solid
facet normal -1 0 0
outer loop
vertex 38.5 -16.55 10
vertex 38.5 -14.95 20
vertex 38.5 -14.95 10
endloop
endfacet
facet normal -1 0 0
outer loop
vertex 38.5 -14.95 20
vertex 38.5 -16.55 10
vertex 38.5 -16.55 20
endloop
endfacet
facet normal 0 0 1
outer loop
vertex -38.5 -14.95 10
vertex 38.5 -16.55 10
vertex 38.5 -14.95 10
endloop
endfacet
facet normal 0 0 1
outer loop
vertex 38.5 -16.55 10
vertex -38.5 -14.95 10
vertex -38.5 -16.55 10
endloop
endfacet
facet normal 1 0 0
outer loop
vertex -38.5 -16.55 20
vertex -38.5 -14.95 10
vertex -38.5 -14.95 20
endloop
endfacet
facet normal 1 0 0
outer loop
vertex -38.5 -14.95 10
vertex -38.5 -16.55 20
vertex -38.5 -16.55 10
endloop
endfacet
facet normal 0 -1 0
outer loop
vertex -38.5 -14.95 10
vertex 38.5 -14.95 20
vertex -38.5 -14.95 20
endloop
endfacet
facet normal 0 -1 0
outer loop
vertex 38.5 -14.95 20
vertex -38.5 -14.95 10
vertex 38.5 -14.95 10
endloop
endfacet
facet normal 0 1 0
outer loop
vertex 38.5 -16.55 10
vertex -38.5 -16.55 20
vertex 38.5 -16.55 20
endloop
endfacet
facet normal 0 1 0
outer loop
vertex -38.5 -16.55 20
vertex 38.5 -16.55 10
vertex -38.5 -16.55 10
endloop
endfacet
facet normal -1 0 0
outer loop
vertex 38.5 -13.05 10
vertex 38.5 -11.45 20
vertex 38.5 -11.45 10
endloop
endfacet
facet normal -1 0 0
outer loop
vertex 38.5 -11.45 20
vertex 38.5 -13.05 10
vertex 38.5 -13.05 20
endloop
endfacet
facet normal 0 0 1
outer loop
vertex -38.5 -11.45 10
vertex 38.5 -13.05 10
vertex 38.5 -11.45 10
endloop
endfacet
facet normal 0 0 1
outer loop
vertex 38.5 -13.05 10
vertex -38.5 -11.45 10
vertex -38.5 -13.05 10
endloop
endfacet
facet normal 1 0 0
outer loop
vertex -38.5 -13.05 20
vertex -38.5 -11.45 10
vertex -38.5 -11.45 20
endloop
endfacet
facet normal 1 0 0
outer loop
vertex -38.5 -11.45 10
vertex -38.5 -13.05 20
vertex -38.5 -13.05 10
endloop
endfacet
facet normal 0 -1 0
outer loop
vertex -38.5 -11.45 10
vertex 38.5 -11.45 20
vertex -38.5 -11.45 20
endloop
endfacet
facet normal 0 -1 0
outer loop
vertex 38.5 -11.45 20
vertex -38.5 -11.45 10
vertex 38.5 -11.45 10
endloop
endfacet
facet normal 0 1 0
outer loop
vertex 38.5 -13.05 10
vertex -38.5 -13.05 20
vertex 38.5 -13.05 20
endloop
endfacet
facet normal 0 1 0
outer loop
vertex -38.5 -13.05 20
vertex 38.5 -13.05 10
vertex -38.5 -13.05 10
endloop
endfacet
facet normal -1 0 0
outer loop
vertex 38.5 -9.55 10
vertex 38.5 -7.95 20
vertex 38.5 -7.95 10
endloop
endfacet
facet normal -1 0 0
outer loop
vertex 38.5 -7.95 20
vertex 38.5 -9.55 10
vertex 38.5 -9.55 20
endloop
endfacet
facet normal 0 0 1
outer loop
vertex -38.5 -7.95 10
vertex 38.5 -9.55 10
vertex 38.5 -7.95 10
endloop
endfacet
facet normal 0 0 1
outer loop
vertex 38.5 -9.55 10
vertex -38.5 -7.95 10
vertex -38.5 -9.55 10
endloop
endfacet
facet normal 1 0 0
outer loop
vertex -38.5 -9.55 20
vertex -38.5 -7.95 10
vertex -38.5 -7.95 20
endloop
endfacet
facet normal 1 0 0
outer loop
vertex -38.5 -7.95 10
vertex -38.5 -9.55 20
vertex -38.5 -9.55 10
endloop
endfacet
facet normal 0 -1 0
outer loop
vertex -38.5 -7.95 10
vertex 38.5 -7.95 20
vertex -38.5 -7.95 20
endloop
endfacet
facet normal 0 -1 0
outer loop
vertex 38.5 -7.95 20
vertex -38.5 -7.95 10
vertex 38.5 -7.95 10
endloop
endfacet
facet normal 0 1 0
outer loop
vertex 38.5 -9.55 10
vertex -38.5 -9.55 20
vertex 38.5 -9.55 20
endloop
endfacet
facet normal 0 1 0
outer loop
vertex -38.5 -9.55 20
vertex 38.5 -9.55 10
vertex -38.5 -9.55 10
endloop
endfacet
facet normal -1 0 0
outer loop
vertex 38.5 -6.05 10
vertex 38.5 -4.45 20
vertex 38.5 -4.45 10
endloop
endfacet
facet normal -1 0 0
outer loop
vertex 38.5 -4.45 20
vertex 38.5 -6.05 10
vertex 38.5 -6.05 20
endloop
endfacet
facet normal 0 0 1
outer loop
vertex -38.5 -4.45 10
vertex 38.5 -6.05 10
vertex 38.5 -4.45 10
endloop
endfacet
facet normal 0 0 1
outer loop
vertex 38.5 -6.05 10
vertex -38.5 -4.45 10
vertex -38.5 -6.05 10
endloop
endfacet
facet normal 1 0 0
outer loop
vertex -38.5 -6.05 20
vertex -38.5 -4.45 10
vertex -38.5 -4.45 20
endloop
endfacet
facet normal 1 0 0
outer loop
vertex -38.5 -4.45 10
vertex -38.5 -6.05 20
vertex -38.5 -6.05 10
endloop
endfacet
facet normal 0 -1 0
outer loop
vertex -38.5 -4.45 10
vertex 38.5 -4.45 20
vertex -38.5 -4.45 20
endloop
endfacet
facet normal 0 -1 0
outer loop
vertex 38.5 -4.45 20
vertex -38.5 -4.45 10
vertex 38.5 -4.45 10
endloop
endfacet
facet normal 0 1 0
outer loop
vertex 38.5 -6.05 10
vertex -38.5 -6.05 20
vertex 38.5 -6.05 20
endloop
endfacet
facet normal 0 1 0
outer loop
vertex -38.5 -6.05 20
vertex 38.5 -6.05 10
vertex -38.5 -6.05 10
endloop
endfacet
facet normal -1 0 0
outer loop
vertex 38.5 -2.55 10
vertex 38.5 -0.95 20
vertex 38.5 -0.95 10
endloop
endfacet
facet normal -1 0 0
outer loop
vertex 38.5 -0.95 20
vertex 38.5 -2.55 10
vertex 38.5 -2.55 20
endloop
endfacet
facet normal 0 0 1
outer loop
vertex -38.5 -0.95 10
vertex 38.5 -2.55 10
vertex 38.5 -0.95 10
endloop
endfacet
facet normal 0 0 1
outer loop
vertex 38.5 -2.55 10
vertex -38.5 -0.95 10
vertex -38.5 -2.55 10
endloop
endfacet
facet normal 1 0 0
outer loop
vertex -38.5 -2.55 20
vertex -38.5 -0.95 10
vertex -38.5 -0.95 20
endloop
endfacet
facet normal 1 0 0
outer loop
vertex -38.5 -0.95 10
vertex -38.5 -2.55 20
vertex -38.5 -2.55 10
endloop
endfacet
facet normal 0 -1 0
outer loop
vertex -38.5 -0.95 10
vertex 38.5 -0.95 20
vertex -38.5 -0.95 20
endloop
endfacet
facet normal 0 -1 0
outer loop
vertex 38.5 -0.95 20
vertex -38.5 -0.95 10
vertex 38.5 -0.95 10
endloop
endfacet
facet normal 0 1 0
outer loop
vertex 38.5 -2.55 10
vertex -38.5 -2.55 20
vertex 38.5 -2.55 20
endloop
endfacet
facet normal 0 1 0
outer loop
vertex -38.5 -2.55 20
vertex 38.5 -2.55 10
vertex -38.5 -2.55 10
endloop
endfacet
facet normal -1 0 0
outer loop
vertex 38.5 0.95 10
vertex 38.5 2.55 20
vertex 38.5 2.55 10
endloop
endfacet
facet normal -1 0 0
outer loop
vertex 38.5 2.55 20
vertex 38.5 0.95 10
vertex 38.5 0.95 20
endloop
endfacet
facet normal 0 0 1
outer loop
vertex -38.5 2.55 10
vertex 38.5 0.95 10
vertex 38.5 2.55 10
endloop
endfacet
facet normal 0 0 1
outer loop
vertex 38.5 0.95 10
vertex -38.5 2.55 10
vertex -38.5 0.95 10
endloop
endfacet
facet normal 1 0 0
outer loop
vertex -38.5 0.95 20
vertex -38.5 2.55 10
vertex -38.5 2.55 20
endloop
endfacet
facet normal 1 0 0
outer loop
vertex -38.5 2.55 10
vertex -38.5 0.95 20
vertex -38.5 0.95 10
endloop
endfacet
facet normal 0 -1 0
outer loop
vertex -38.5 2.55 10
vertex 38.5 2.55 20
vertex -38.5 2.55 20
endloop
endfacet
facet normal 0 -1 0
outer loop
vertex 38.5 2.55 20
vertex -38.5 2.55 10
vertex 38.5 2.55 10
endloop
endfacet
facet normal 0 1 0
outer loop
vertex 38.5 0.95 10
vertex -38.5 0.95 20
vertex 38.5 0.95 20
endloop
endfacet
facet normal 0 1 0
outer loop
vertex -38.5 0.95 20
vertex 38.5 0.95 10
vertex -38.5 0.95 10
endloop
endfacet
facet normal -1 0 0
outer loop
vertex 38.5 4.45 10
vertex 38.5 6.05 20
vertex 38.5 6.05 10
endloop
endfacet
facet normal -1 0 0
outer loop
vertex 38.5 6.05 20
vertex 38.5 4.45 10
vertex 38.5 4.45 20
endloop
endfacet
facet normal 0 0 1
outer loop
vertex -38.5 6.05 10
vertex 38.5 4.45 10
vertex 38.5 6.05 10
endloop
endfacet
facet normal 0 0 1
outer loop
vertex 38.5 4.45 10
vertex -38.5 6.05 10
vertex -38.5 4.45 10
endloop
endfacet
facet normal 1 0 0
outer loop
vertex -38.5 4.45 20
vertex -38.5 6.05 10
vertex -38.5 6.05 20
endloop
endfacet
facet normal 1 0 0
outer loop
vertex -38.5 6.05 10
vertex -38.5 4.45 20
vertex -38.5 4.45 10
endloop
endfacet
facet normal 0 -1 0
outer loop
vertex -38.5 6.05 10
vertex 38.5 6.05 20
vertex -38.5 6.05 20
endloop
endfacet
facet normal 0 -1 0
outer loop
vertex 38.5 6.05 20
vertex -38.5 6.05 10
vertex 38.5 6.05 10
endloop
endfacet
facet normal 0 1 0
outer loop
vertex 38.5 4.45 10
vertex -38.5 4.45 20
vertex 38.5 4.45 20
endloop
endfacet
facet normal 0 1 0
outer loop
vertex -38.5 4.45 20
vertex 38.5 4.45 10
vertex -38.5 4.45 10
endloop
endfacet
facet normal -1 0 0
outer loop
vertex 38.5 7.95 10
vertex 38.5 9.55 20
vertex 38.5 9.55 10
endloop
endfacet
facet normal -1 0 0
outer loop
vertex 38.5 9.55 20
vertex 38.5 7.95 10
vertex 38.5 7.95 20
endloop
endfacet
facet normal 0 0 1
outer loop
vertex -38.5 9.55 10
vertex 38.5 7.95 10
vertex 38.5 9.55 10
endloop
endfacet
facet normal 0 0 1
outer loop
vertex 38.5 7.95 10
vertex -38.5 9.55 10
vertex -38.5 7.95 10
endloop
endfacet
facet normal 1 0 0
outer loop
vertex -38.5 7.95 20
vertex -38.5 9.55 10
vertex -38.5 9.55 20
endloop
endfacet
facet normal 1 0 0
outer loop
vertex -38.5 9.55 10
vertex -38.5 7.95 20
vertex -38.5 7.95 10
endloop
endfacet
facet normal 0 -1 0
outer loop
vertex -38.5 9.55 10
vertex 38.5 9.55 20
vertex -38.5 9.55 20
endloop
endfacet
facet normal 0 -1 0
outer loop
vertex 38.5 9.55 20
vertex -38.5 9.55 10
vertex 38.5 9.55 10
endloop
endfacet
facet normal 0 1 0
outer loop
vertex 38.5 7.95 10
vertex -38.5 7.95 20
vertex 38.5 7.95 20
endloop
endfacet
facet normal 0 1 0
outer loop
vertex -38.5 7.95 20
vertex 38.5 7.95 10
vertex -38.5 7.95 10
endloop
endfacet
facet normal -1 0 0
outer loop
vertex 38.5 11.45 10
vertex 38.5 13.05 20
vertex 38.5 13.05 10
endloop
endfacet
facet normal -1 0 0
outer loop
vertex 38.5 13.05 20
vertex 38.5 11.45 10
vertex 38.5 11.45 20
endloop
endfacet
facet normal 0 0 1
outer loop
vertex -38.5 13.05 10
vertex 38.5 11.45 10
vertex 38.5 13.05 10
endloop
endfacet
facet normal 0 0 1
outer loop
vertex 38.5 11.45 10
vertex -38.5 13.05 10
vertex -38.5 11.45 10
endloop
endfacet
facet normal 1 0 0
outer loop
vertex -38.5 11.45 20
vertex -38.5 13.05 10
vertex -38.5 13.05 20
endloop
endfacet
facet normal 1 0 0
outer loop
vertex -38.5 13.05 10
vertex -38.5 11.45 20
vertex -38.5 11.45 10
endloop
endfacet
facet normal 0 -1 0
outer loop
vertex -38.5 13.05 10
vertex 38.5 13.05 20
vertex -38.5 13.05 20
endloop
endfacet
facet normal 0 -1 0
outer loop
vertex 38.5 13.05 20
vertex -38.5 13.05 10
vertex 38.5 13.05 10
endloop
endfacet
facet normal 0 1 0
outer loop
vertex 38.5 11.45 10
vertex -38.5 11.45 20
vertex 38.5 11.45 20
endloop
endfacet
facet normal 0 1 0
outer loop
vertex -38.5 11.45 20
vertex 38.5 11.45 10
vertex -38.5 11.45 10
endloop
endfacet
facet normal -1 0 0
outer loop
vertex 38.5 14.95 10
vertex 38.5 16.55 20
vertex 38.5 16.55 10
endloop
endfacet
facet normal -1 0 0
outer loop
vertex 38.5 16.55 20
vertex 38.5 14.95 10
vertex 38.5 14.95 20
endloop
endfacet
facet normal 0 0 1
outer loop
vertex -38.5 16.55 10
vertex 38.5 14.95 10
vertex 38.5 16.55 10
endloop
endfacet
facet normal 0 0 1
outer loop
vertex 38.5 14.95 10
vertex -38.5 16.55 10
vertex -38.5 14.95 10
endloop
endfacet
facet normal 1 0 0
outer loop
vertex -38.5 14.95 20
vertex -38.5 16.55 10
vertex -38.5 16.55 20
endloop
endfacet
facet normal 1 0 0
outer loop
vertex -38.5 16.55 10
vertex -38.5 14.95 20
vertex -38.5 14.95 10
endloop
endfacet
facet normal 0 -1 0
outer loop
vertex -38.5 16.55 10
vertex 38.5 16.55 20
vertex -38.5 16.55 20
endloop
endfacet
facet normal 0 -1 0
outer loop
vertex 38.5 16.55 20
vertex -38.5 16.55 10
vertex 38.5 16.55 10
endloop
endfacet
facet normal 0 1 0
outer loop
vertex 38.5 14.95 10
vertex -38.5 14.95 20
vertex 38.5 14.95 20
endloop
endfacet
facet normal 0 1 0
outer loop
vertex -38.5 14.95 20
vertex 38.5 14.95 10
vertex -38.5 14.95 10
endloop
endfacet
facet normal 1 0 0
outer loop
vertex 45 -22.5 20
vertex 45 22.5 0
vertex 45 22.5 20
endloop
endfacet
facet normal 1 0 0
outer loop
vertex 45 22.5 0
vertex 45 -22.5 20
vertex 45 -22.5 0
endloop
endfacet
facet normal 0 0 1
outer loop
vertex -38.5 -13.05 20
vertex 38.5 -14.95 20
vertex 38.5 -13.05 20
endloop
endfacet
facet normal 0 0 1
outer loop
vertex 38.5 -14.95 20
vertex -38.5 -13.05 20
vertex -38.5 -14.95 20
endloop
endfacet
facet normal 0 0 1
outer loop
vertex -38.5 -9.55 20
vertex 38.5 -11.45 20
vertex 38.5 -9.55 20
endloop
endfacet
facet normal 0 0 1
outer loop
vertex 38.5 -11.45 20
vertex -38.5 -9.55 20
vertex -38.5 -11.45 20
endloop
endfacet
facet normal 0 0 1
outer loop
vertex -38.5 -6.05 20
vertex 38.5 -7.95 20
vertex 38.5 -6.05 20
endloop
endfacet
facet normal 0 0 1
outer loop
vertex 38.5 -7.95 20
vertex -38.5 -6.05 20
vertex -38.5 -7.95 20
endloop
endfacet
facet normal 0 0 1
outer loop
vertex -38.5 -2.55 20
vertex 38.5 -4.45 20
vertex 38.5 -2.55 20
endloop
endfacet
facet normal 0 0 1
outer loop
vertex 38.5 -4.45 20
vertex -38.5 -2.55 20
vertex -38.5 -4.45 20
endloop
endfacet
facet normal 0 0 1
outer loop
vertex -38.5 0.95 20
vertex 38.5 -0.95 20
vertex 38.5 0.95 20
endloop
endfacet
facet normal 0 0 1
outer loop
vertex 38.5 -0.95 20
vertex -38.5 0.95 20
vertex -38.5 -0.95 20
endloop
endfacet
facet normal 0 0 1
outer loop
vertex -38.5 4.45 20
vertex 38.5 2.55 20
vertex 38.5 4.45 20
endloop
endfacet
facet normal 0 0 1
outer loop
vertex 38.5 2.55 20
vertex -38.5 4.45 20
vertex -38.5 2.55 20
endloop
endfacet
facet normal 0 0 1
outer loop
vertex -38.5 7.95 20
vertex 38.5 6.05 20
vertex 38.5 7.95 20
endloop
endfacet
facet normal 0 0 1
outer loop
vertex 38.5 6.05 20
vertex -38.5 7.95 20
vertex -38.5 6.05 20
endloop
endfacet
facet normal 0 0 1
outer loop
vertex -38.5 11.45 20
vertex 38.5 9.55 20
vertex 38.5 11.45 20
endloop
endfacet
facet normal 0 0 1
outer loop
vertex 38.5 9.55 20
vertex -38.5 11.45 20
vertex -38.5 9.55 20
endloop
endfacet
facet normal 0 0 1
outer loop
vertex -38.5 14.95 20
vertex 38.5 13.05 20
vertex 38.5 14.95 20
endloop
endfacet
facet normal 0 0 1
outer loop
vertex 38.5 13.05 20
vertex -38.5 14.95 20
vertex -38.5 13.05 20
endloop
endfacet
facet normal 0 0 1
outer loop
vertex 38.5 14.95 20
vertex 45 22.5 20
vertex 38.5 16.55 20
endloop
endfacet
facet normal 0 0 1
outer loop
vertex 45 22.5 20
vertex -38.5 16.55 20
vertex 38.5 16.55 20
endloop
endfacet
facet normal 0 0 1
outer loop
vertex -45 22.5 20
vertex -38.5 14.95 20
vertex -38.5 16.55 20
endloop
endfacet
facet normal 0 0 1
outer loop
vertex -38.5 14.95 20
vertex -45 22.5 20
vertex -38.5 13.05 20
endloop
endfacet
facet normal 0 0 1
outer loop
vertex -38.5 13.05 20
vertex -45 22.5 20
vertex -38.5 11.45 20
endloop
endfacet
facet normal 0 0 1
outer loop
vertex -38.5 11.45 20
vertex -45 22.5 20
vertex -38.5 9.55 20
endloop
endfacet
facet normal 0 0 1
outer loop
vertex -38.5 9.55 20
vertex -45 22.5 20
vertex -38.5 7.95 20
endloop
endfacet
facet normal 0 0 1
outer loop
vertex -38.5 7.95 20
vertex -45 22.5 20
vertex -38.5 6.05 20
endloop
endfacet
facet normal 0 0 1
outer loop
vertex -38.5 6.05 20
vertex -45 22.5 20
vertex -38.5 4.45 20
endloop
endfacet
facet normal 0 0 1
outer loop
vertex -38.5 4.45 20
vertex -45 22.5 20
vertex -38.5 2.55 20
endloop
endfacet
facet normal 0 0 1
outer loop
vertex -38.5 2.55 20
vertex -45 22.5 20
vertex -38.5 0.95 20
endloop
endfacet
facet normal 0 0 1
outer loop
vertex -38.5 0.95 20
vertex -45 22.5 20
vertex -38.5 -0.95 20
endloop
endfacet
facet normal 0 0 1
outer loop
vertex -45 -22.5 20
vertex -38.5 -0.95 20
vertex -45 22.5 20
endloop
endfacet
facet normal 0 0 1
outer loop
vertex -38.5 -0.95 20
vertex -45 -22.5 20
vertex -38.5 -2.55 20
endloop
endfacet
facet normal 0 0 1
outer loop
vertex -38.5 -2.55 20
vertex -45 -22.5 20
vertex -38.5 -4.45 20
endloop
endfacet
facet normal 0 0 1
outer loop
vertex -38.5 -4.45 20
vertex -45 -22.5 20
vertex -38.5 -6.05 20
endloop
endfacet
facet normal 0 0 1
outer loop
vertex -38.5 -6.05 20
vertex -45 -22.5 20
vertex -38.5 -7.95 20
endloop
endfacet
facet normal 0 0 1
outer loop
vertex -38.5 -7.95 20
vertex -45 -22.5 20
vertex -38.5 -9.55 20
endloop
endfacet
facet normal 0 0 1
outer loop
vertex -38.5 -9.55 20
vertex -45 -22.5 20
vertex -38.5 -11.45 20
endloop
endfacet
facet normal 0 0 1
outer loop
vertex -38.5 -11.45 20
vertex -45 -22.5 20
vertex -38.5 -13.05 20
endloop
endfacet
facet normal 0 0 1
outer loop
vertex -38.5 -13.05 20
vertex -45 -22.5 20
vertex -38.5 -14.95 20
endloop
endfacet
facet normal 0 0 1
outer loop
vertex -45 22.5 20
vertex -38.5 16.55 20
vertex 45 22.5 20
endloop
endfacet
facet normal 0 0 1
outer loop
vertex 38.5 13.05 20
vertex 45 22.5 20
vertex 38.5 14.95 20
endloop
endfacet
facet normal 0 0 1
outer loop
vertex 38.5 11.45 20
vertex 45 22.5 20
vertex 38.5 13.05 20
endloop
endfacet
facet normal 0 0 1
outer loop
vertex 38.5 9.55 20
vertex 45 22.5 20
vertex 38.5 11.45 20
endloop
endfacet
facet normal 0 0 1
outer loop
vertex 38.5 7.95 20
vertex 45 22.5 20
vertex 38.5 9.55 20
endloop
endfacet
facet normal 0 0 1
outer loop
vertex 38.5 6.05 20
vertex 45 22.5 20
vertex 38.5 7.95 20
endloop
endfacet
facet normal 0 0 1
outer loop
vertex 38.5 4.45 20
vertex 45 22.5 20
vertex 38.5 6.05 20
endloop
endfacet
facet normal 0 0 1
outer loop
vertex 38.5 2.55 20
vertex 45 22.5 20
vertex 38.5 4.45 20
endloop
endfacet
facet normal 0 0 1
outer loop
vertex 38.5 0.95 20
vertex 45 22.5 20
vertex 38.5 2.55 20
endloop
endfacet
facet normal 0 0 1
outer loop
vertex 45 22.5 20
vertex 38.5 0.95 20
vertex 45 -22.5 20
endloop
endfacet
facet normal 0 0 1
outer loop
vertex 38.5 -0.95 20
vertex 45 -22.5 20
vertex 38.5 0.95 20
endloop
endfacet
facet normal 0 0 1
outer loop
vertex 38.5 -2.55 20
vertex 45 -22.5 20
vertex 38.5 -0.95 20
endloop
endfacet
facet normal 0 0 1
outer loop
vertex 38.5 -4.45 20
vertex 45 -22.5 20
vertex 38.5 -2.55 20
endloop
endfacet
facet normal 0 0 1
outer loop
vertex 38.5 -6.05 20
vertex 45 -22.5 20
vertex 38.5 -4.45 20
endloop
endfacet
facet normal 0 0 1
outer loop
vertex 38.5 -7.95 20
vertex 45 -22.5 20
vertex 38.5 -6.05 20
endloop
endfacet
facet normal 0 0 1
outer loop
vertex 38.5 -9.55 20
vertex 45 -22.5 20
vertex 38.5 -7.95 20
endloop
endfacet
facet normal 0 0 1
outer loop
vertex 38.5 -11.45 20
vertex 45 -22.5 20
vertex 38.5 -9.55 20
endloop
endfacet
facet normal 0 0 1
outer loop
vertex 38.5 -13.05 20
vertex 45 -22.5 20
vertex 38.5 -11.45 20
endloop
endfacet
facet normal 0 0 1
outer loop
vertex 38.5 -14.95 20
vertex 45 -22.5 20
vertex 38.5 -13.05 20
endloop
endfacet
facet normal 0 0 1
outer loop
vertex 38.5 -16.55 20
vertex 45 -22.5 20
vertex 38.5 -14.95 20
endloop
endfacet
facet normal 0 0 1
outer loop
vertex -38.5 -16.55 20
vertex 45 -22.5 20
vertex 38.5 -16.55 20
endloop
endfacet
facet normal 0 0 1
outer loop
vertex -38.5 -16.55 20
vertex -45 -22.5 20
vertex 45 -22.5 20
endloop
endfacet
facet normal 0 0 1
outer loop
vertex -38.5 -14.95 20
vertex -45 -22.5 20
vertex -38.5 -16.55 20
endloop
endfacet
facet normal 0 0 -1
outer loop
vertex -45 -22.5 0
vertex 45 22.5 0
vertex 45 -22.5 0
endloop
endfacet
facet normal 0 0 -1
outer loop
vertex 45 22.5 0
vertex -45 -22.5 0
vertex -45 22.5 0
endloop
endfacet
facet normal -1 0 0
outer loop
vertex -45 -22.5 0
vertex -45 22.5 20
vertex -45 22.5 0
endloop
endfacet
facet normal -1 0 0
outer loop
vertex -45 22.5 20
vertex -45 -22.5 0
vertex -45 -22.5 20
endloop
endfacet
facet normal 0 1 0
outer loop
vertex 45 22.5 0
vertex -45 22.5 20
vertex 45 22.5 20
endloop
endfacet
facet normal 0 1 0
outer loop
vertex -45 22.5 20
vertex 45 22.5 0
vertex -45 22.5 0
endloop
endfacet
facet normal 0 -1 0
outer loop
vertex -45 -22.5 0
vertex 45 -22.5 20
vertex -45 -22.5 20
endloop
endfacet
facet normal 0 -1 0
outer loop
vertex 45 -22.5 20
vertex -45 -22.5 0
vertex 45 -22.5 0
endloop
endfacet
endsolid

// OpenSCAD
// Microscope Slide Drying Rack
// Designed for 10 slides (75x25x1mm) standing on long edge.

// Block dimensions
L_block = 90.0;    // Length (X)
W_block = 45.0;    // Width (Y)
H_block = 20.0;    // Height (Z)

// Slot dimensions
L_slot = 77.0;     // Slot length (X)
W_slot = 1.6;      // Slot width (Y)
D_slot = 10.0;     // Slot depth (Z)
N_slots = 10;      // Number of slots
P_slots = 3.5;     // Pitch (center-to-center distance in Y)

$fn = 64;

module rack() {
    difference() {
        // The main base block
        translate([-L_block/2, -W_block/2, 0])
            cube([L_block, W_block, H_block]);

        // The slots
        for (i = [0 : N_slots - 1]) {
            // Calculate Y position for this slot to ensure the group is centered
            // The center of the i-th slot is: -(N-1)*P/2 + i*P
            y_pos = (-(N_slots - 1) * P_slots / 2) + (i * P_slots);
            
            // To ensure a clean cut, the cutting cube extends slightly 
            // beyond the boundaries of the block/slot dimensions.
            // We use L_slot + 2 to ensure it cuts through the X-faces 
            // if the slot were to be longer, but here we must ensure 
            // the resulting hole is exactly L_slot.
            // We achieve this by making the cutting shape slightly larger 
            // than the target dimension and centering it.
            
            translate([0, y_pos, H_block - D_slot + 0.01]) {
                // We use a cube that is slightly larger in X and Y to ensure 
                // no zero-thickness walls, but we must be careful not to 
                // change the actual dimension of the slot.
                // The slot length is L_slot. We want the hole to be L_slot.
                // We will use a cube of size [L_slot + 2, W_slot + 2, D_slot + 1]
                // and translate it so the "inner" part is the correct size.
                // Actually, the simplest way: make the cube [L_slot + 2, W_slot + 2, D_slot + 1]
                // and translate it so it is centered on the target slot.
                // However, the user wants the slot to be 77mm. 
                // If I cut a 79mm hole, the slot is 79mm.
                // To get a 77mm hole, the cutting cube must be 77mm wide.
                // To avoid coplanar faces, we extend the cutting cube in Z.
                
                // Correct approach:
                // The slot is 77mm long. The block is 90mm long.
                // The slot is centered on X.
                // The cutting cube should be [77, 1.6, 10.01]
                // To avoid coplanar faces on the top, we extend Z.
                // To avoid coplanar faces on the sides (if L_slot was 90), we extend X.
                // Since L_slot (77) < L_block (90), we don't need to extend X 
                // to avoid side-wall issues, but we do need to extend Z to avoid top-face issues.
                
                translate([-L_slot/2, -W_slot/2, -0.01])
                    cube([L_slot, W_slot, D_slot + 0.02]);
            }
        }
    }
}

// Render the part
rack();
